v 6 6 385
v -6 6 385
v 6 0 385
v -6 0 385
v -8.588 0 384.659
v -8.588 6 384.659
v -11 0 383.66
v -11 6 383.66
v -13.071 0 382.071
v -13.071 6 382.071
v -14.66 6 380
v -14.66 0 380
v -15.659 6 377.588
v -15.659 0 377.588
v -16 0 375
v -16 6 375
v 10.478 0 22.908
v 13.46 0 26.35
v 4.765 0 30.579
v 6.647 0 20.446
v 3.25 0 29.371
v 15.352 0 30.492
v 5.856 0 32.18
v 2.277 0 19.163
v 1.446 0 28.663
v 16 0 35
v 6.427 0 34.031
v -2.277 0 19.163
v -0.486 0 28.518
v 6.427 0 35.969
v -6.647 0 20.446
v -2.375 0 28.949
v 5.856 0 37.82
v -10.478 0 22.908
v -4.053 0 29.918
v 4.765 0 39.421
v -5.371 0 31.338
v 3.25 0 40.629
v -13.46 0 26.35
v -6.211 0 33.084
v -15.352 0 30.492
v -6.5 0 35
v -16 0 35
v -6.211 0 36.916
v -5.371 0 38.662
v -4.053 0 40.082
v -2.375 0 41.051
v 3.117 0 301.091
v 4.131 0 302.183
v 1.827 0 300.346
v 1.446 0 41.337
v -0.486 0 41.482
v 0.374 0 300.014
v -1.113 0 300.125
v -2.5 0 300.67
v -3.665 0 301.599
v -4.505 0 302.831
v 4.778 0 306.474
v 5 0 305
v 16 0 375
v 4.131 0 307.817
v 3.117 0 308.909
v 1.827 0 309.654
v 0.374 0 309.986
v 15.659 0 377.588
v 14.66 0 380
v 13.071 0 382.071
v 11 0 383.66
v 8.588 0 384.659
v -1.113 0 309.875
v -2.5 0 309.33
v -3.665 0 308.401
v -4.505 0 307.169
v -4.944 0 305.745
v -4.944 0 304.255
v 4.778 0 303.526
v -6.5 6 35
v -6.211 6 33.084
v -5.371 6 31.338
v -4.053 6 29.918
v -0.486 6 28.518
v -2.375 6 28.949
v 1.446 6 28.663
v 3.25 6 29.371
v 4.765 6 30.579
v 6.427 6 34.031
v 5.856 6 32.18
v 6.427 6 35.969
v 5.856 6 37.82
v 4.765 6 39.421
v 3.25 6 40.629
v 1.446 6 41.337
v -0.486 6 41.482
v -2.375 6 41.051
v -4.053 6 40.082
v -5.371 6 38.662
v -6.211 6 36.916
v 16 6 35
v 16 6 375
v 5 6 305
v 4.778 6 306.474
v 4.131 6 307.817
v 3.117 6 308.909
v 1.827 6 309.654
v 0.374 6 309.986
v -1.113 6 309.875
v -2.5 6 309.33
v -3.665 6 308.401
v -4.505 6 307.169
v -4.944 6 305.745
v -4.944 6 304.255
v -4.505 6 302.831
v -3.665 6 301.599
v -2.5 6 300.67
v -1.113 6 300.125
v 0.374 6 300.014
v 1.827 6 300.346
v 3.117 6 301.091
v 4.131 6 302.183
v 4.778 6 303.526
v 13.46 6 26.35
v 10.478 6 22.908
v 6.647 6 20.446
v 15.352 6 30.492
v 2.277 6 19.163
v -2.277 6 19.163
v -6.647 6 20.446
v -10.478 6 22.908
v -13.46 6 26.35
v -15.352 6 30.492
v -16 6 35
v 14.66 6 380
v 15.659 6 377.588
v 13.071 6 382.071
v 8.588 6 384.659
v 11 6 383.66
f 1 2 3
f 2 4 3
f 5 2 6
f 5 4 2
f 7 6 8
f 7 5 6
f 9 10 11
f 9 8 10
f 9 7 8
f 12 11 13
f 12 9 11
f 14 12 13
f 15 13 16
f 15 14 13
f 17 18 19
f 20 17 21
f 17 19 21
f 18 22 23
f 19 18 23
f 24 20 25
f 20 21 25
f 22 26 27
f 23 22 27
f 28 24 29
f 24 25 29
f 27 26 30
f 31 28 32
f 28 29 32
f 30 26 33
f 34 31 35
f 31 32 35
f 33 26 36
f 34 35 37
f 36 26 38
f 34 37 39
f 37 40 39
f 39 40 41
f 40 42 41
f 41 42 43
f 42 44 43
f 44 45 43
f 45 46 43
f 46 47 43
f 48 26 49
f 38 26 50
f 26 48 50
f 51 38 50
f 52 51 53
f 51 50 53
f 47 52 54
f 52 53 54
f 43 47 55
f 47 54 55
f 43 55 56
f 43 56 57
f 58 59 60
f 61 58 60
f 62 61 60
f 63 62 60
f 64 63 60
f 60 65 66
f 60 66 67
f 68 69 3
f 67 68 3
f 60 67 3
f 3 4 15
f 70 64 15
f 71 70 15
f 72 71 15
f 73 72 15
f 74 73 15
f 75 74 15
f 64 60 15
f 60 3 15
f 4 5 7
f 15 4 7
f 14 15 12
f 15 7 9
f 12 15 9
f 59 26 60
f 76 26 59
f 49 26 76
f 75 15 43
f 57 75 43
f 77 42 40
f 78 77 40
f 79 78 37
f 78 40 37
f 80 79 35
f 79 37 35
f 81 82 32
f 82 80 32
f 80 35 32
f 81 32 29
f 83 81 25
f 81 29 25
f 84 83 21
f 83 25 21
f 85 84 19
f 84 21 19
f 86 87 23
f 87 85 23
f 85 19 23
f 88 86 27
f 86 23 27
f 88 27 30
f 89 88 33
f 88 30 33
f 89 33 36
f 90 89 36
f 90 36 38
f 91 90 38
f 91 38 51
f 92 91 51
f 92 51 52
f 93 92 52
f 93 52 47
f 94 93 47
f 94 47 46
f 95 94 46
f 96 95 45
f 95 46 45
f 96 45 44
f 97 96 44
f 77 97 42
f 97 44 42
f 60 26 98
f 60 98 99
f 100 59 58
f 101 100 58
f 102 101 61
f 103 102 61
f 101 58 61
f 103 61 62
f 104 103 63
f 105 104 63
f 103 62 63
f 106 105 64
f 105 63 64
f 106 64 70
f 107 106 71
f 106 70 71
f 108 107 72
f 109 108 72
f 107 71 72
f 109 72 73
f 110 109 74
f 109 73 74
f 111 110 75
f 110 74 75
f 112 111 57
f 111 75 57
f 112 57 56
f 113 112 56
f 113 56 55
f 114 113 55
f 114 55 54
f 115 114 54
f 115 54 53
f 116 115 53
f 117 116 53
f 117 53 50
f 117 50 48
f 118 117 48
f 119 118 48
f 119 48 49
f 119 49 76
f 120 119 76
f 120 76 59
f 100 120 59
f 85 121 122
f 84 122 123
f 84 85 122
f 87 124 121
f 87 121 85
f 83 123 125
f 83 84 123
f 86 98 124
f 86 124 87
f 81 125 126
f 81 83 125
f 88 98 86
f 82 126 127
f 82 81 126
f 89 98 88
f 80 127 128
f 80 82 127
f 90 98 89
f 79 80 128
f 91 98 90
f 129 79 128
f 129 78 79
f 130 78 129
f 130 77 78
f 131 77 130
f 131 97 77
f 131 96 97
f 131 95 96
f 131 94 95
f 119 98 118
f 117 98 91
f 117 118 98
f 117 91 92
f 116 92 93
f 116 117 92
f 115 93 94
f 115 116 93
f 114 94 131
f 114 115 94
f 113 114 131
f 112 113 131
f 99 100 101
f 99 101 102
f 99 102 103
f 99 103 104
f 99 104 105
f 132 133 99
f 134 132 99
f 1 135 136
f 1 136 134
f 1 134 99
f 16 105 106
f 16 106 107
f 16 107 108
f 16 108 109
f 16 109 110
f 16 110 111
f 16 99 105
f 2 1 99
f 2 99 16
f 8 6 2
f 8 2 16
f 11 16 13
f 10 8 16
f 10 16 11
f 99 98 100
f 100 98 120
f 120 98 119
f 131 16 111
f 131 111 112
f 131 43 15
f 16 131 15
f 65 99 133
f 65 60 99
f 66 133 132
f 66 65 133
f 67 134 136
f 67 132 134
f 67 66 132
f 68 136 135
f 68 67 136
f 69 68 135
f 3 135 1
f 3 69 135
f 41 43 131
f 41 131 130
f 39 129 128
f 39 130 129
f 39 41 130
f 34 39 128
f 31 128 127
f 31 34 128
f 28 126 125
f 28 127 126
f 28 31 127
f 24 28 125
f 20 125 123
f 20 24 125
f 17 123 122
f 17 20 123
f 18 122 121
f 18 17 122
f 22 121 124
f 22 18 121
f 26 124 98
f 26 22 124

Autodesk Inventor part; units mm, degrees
ref_plane "YZ Plane" through (0, 0, 0) normal (1, 0, 0) x (0, 1, 0)
ref_plane "XZ Plane" through (0, 0, 0) normal (0, 1, 0) x (-1, 0, 0)
ref_plane "XY Plane" through (0, 0, 0) normal (0, 0, 1) x (1, 0, 0)
sketch "Náčrt2" plane through (0, 0, 0) normal (0, 1, 0) x (-1, 0, 0)
  line L0 (11.5, 17.5) -> (-11.5, 17.5) construction
  line L1 (-17.5, 11.5) -> (-17.5, -11.5) construction
  line L2 (-11.5, -17.5) -> (11.5, -17.5) construction
  line L3 (17.5, -11.5) -> (17.5, 11.5) construction
  line L4 (42.5, 36) -> (42.5, -77.5) construction
  line L5 (9, -22.5) -> (-14, -22.5) construction
  line L6 (-20, -28.5) -> (-20, -51.5) construction
  line L7 (-14, -57.5) -> (9, -57.5) construction
  line L8 (15, -51.5) -> (15, -28.5) construction
  arc A0 (15, -28.5) -> (9, -22.5) centre (9, -28.5) ccw construction
  arc A1 (9, -57.5) -> (15, -51.5) centre (9, -51.5) ccw construction
  arc A2 (-20, -51.5) -> (-14, -57.5) centre (-14, -51.5) ccw construction
  arc A3 (-14, -22.5) -> (-20, -28.5) centre (-14, -28.5) ccw construction
  line L9 (-45.6938, -20) -> (9, -20) construction
  arc A4 (17.5, -28.5) -> (9, -20) centre (9, -28.5) ccw construction
  line L10 (17.5, -28.5) -> (17.5, -51.5) construction
  line L11 (17.5, -51.5) -> (15, -51.5) construction
  line L12 (-14, -22.5) -> (-45.6938, -22.5) construction
  line L13 (-45.6938, -22.5) -> (-45.6938, -20) construction
  arc A5 (17.5, 11.5) -> (11.5, 17.5) centre (11.5, 11.5) ccw construction
  arc A6 (11.5, -17.5) -> (17.5, -11.5) centre (11.5, -11.5) ccw construction
  arc A7 (-17.5, -11.5) -> (-11.5, -17.5) centre (-11.5, -11.5) ccw construction
  arc A8 (-11.5, 17.5) -> (-17.5, 11.5) centre (-11.5, 11.5) ccw construction
  line L14 (-11.5, -20) -> (11.5, -20) construction
  line L15 (-20, 73.4113) -> (-20, -11.5) construction
  arc A9 (-20, -11.5) -> (-11.5, -20) centre (-11.5, -11.5) ccw construction
  line L16 (-17.5, 11.5) -> (-17.5, 73.4113) construction
  line L17 (-17.5, 73.4113) -> (-20, 73.4113) construction
  line L18 (11.5, -20) -> (11.5, -17.5) construction
  line L19 (17.5, 17.5) -> (-17.5, 17.5) construction
  line L20 (-17.5, 17.5) -> (-17.5, 52.5) construction
  line L21 (-17.5, 52.5) -> (17.5, 52.5) construction
  line L22 (17.5, 52.5) -> (17.5, 17.5) construction
  circle A10 centre (0, 35) radius 6.5
  arc A11 (0, 51) -> (0, 19) centre (0, 35) ccw construction
  line L23 (0, 51) -> (27.5, 51) construction
  line L24 (0, 19) -> (11.5, 19) construction
  line L25 (27.5, 51) -> (42.5, 36) construction
  arc A12 (17.5, 13) -> (11.5, 19) centre (11.5, 13) ccw construction
  line L26 (17.5, 13) -> (17.5, -51.5) construction
  line L27 (-13.5, -57.5) -> (-13.5, -59.2574) construction
  line L28 (-12.6213, -61.3787) -> (14.1066, -88.1066) construction
  line L29 (24.7132, -92.5) -> (27.5, -92.5) construction
  arc A13 (27.5, -92.5) -> (42.5, -77.5) centre (27.5, -77.5) ccw construction
  arc A14 (14.1066, -88.1066) -> (24.7132, -92.5) centre (24.7132, -77.5) ccw construction
  arc A15 (-13.5, -59.2574) -> (-12.6213, -61.3787) centre (-10.5, -59.2574) ccw construction
  line L30 (17.5, -51.5) -> (17.5, -51.5) construction
  line L31 (6.4677, -58.2408) -> (-10.5, -57.5) construction
  line L32 (-13.5, -57.5) -> (-10.5, -57.5) construction
  line L33 (6.4677, -58.2408) -> (6.5, -57.5) construction
  line L34 (6.5, -57.5) -> (11.5, -57.5) construction
  arc A16 (11.5, -57.5) -> (17.5, -51.5) centre (11.5, -51.5) ccw construction
  arc A17 (-16, 35) -> (16, 35) centre (0, 35) ccw
  line L35 (16, 35) -> (16, 375)
  line L36 (-16, 35) -> (-16, 375)
  line L37 (6, 385) -> (-6, 385)
  arc A18 (16, 375) -> (6, 385) centre (6, 375) ccw
  arc A19 (-6, 385) -> (-16, 375) centre (-6, 375) ccw
  point P0 (0, 0)
  point P1 (17.5, 0)
  point P2 (0, 17.5)
  point P3 (42.5, 51)
  point P4 (17.5, 35)
  point P5 (0, 52.5)
  point P6 (-13.5, -60.5)
  dimension "d34" = 35
  dimension "d35" = 6
  dimension "d36" = 5
  dimension "d37" = 2.5
  dimension "d38" = 2.5
  dimension "d39" = 6
  dimension "d40" = 2.5
  dimension "d43" = 25
  dimension "d46" = 13
  dimension "d47" = 32
  dimension "d48" = 15
  dimension "d49" = 15
  dimension "d50" = 6
  dimension "d51" = 35
  dimension "d55" = 3
  dimension "d56" = 15
  dimension "d57" = 15
  dimension "d58" = 3
  dimension "d60" = 35
  dimension "d61" = 3
  dimension "d62" = 2.5
  dimension "d63" = 35
  dimension "d64" = 45
  dimension "d66" = 31
  dimension "d69" = 6
  dimension "d72" = 2.5
  dimension "d73" = 350
  dimension "d74" = 10
extrude "Vysunutí1" add sketch "Náčrt2" along normal blind 6
sketch "Náčrt5" plane through (0, 0, 0) normal (0, -1, 0) x (1, 0, 0)
  circle A0 centre (0, 35) radius 6.5 projected
  arc A1 (-16, 35) -> (16, 35) centre (0, 35) ccw projected
  line L0 (16, 375) -> (16, 35) projected
  arc A2 (16, 375) -> (6, 385) centre (6, 375) ccw projected
  line L1 (-6, 385) -> (6, 385) projected
  arc A3 (-6, 385) -> (-16, 375) centre (-6, 375) ccw projected
  line L2 (-16, 35) -> (-16, 375) projected
  circle A4 centre (0, 305) radius 5
  point P0 (0, 0)
  point P1 (0, 385)
  dimension "d75" = 10
  dimension "d76" = 80
extrude "Vysunutí3" cut sketch "Náčrt5" against normal blind 10 contours A4
equation "\"d49\" = d48"
equation "\"PoloměrOhybu\" = Tloušťka"
equation "\"ŠířkaVýštipu\" = Tloušťka"
equation "\"HloubkaVýštipu\" = 0.5 * Tloušťka"
equation "\"VelikostRohovéhoVýštipu\" = 4 * Tloušťka"
equation "\"MinimálníZbytek\" = 2 * Tloušťka"
equation "\"PřechodovýPoloměr\" = PoloměrOhybu"
equation "\"VelikostJacobihoPoloměru\" = PoloměrOhybu"
equation "\"VelikostMezery\" = Tloušťka"
equation "\"Tloušťka\" = 6"
properties part number "DD_KVD_002_09" material "Nerezová ocel"
